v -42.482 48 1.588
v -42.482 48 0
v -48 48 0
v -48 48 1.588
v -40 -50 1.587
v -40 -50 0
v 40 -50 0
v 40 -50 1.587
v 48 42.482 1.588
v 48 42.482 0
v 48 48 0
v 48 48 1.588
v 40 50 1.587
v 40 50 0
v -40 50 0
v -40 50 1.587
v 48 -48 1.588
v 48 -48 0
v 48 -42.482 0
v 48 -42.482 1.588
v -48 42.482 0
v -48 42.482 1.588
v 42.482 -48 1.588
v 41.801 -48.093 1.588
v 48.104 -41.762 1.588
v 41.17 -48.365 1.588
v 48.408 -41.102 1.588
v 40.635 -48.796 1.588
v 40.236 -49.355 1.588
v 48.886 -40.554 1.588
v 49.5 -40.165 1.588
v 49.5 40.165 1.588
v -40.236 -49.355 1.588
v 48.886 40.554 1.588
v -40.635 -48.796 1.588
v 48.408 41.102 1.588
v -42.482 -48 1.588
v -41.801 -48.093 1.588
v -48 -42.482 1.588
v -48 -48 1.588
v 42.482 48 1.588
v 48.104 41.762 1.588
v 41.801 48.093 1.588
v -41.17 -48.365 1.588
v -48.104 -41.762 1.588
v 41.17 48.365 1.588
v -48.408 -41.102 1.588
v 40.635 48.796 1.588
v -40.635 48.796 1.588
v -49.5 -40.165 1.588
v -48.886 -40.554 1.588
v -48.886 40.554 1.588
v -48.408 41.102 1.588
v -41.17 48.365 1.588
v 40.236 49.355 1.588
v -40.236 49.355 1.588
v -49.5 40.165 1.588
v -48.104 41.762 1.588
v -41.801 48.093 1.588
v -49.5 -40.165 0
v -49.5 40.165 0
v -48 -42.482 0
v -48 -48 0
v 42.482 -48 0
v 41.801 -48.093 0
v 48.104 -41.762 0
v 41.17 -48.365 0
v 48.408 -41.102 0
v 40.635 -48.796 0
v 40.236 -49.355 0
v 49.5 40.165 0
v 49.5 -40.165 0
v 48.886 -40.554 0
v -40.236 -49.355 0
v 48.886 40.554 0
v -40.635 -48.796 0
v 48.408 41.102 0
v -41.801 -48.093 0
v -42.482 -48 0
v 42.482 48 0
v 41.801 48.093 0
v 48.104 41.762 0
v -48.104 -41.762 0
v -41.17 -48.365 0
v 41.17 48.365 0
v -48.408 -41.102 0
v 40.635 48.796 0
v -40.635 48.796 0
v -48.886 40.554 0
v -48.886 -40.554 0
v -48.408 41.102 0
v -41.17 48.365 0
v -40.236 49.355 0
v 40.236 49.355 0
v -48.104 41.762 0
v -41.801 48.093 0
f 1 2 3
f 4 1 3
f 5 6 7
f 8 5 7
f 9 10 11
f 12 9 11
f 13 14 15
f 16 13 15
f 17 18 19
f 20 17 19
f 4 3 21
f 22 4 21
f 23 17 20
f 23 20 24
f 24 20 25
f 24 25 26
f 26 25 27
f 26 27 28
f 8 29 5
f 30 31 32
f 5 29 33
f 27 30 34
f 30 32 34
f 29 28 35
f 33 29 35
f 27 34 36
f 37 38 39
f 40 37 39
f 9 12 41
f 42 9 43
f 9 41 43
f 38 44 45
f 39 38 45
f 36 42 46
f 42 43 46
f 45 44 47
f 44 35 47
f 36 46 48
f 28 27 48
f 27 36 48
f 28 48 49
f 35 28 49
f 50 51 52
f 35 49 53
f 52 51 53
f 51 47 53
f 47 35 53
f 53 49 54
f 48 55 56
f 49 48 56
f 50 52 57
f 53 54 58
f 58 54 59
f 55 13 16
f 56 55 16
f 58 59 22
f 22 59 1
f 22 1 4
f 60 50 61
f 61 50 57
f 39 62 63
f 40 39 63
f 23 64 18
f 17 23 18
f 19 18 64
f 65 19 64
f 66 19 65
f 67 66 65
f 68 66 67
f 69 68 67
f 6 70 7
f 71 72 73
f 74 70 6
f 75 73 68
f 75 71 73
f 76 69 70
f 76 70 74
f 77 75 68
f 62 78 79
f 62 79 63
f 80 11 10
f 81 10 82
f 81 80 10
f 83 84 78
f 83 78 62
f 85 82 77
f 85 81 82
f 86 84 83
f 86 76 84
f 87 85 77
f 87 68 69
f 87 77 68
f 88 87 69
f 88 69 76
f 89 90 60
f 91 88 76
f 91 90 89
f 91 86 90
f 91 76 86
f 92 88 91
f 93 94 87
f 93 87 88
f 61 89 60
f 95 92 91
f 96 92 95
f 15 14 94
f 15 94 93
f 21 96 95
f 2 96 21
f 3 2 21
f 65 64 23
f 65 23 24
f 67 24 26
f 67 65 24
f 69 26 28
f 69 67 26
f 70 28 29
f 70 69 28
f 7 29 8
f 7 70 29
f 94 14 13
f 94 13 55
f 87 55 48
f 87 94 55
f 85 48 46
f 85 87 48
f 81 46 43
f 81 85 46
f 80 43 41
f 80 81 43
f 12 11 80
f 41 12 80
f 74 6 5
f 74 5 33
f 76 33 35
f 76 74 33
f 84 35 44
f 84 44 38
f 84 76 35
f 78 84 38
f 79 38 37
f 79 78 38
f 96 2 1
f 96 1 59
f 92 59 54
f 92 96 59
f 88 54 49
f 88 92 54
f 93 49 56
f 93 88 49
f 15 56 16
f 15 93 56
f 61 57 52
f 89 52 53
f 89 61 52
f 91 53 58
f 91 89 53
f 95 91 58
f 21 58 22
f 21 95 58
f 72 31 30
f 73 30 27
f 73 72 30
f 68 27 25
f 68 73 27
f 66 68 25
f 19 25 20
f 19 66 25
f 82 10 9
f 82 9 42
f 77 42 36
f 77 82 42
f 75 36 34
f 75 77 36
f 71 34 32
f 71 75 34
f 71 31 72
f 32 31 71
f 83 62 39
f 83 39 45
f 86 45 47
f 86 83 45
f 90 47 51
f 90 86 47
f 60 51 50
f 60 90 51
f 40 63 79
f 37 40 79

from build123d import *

# Parameters (mm, degrees)
BOSS_EXTRUDE1_DEPTH = 1.5875
FILLET1_R           = 2.54
SKETCH6_OUTSIDE_W   = 130.286
SKETCH6_OUTSIDE_H   = 130.286
SKETCH6_OUTSIDE_W_2 = 99
SKETCH6_OUTSIDE_H_2 = 100
CUT_EXTRUDE2_DEPTH  = 71.728496069


with BuildPart() as part:
    # Sketch1 → Boss-Extrude1 (new body)
    with BuildSketch(Plane.XY):
        Polygon((40, 50), (-40, 50), (-40, 48), (-48, 48), (-48, 40), (-50, 40), (-50, -37.864895224), (-50, -40), (-48, -40), (-48, -48), (-40, -48), (-40, -50), (-37.864895224, -50), (40, -50), (40, -48), (48, -48), (48, -40), (50, -40), (50, 40), (48, 40), (48, 48), (40, 48), align=None)
    extrude(amount=BOSS_EXTRUDE1_DEPTH)

    # Fillet1
    # the kernel refuses this fillet: 2.54 mm, written as the material it adds along each edge
    with BuildSketch(Plane(origin=(-48, -40, 0), x_dir=(0, -1, 0), z_dir=(0, 0, 1)), Plane(origin=(40, -48, 0), x_dir=(1, 0, 0), z_dir=(0, 0, 1)), Plane(origin=(48, 40, 0), x_dir=(0, 1, 0), z_dir=(0, 0, 1)), Plane(origin=(-40, 48, 0), x_dir=(-1, 0, 0), z_dir=(0, 0, 1))) as fillet1_piece_1:
        with BuildLine():
            CenterArc((2.481934729, -2.54), FILLET1_R, 90, 77.725329785)
            Line((0, -2), (-0.049638695, -1.9892))
            ThreePointArc((-0.049638695, -1.9892), (-0.0508, -1), (-0.0508, 0))
            Line((-0.0508, 0), (0, 0.0508))
            Line((0, 0.0508), (2.481934729, 0.0508))
            Line((2.481934729, 0.0508), (2.481934729, 0))
        make_face()
    extrude(amount=1.5875)
    with BuildSketch(Plane(origin=(-40, -48, 0), x_dir=(-3.737454790095179e-12, -1.0, 0), z_dir=(0, 0, 1)), Plane(origin=(48, -40, 0), x_dir=(1.0, -3.7339020764163554e-12, 0), z_dir=(0, 0, 1)), Plane(origin=(-48, 40, 0), x_dir=(-1.0, 3.737454790095126e-12, 0), z_dir=(0, 0, 1))) as fillet1_piece_2:
        with BuildLine():
            CenterArc((2.54, -2.481934729), FILLET1_R, 102.274670215, 77.725329785)
            Line((0, -2.481934729), (-0.0508, -2.481934729))
            Line((-0.0508, -2.481934729), (-0.0508, 0))
            Line((-0.0508, 0), (0, 0.0508))
            ThreePointArc((0, 0.0508), (1, 0.0508), (1.9892, 0.049638695))
            Line((1.9892, 0.049638695), (2, 0))
        make_face()
    extrude(amount=1.5875)
    with BuildSketch(Plane(origin=(40, 48, 0), x_dir=(1, 0, 0), z_dir=(0, 0, 1))) as fillet1_piece_3:
        with BuildLine():
            CenterArc((2.481934729, 2.54), FILLET1_R, 192.274670215, 77.725329785)
            Line((0, 2), (-0.049638695, 1.9892))
            ThreePointArc((-0.049638695, 1.9892), (-0.0508, 1), (-0.0508, 0))
            Line((-0.0508, 0), (0, -0.0508))
            Line((0, -0.0508), (2.481934729, -0.0508))
            Line((2.481934729, -0.0508), (2.481934729, 0))
        make_face()
    extrude(amount=1.5875)

    # Sketch6 outside → Cut-Extrude2 (cut, through all)
    with BuildSketch(Plane.XY.offset(1.5875)):
        Rectangle(SKETCH6_OUTSIDE_W, SKETCH6_OUTSIDE_H)
        Rectangle(SKETCH6_OUTSIDE_W_2, SKETCH6_OUTSIDE_H_2, mode=Mode.SUBTRACT)
    extrude(amount=-CUT_EXTRUDE2_DEPTH, mode=Mode.SUBTRACT)


solid = part.part
